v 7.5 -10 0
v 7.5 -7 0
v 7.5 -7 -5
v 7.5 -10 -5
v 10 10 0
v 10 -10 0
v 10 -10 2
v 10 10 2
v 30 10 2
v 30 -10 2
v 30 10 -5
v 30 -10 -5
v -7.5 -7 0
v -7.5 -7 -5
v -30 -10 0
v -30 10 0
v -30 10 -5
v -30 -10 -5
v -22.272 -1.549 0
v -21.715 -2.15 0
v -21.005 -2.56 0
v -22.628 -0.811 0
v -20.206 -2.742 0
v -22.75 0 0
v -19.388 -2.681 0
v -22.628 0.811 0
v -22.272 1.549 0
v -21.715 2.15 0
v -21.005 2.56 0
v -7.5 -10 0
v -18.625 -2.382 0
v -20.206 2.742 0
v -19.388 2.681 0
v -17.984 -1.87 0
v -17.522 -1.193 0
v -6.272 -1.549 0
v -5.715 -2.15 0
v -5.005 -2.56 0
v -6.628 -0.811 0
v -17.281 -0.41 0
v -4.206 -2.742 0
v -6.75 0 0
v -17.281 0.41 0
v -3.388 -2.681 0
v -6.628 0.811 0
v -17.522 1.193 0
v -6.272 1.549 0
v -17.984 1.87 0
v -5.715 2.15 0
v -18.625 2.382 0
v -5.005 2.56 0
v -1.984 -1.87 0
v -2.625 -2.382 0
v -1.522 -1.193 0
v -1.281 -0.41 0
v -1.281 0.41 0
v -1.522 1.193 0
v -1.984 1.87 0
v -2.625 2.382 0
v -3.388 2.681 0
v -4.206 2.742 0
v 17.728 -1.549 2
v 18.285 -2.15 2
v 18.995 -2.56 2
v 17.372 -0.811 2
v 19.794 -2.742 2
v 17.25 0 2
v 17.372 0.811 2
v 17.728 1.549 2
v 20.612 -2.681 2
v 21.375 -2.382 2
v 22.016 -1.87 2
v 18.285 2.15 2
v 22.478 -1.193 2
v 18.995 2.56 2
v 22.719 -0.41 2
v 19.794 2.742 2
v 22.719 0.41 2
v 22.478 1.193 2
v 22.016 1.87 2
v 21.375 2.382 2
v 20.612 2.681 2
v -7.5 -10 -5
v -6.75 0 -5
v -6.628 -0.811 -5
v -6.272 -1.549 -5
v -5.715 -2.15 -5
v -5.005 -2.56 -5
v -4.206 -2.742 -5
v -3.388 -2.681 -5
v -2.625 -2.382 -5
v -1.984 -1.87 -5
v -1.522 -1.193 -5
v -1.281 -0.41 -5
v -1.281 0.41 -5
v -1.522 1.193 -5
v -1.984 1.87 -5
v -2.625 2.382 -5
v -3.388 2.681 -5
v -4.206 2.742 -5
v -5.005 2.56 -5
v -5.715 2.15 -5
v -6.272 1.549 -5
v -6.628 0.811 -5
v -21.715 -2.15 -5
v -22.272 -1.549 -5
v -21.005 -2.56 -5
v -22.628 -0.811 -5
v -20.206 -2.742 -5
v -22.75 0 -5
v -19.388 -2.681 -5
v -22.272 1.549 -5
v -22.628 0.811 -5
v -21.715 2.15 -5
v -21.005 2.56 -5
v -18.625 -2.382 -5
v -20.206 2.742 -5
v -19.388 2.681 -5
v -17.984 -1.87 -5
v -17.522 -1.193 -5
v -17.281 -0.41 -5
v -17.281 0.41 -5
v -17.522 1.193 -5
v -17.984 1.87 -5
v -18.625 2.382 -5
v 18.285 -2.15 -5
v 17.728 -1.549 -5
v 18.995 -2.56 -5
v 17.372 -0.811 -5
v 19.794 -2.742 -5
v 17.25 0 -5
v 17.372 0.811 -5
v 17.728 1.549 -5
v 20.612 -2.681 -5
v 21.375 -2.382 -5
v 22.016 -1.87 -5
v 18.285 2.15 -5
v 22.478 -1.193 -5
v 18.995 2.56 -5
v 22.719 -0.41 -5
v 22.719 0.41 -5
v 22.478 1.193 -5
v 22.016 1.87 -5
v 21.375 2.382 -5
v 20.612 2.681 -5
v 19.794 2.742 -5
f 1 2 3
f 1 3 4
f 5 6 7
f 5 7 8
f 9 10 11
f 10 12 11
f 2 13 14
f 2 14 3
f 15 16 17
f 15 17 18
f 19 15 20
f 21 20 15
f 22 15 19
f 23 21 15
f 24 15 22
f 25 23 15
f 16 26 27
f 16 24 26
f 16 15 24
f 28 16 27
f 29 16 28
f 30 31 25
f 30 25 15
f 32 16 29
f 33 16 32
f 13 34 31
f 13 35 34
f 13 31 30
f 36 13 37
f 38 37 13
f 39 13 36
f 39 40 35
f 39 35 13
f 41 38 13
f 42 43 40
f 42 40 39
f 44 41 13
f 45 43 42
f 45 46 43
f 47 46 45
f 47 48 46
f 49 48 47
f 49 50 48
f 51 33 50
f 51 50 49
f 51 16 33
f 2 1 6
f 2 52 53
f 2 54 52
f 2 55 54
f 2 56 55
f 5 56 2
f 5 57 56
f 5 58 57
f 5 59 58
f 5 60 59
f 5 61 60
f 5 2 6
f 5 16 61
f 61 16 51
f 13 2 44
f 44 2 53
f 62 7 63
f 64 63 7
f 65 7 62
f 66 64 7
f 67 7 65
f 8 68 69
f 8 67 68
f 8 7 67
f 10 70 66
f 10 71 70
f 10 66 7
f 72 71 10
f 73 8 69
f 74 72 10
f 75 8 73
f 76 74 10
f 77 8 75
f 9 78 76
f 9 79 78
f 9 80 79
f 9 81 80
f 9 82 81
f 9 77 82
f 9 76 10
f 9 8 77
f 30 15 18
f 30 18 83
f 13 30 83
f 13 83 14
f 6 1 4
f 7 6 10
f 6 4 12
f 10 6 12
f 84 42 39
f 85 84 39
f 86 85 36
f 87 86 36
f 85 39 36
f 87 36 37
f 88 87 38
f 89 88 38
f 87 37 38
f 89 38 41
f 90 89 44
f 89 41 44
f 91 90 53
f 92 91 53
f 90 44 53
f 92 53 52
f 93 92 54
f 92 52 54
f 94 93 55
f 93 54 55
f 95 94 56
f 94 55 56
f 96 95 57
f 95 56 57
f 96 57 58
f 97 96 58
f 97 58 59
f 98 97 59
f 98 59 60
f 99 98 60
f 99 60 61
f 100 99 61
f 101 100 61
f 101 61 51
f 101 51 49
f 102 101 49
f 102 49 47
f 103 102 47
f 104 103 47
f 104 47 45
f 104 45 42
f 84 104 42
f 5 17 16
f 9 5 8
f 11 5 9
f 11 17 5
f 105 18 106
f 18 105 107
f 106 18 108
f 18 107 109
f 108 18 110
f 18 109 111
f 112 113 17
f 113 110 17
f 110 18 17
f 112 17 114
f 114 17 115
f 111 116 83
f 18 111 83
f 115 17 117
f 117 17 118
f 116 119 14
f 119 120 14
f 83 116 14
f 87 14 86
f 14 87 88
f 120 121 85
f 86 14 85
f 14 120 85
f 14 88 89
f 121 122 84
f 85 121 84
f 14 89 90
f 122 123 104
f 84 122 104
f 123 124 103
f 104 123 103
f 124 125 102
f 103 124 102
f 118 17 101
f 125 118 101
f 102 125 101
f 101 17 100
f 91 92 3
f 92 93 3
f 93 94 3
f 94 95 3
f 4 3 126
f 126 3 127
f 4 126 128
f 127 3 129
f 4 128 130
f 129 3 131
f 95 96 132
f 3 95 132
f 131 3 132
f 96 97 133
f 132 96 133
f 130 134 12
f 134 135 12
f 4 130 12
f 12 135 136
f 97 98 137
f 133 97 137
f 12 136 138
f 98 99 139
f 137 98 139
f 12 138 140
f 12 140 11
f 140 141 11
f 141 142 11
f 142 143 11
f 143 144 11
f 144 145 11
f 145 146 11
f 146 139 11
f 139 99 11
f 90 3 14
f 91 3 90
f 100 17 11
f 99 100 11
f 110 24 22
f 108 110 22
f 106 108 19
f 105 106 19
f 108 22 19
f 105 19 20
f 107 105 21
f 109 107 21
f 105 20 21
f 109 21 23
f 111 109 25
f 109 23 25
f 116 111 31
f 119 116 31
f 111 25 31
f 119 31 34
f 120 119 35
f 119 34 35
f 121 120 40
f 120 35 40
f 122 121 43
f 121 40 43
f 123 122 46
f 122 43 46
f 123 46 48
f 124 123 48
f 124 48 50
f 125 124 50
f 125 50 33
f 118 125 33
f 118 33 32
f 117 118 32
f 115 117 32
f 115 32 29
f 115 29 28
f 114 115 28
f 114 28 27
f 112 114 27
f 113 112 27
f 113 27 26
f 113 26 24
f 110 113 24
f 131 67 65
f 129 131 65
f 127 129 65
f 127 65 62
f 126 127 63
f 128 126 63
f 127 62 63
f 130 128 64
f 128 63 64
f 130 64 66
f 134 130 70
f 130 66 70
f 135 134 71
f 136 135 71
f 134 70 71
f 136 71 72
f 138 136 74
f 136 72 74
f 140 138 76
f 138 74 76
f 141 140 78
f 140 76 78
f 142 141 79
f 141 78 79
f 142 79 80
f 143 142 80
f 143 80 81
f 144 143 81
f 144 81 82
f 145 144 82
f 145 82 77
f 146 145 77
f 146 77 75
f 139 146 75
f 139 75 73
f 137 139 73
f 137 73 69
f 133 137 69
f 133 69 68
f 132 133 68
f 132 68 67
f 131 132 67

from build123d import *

# Parameters (mm, degrees)
F0_W     = 20
F0_H     = 20
F1_DEPTH = 5
F2_DEPTH = 2
F4_D     = 5.5


with BuildPart() as f1:
    # F0 (on Top) → F1 (new body)
    with BuildSketch(Plane.XY):
        Polygon((10, 10), (-30, 10), (-30, -10), (-7.5, -10), (-7.5, -7), (7.5, -7), (7.5, -10), (10, -10), align=None)
        with Locations((20, 0)):
            Rectangle(F0_W, F0_H)
    extrude(amount=-F1_DEPTH)

    # F0 (on Top) → F2 (join)
    with BuildSketch(Plane.XY):
        with Locations((20, 0)):
            Rectangle(F0_W, F0_H)
    extrude(amount=F2_DEPTH)

    # F4 (through all)
    with Locations(Plane(origin=(0, 0, -5), x_dir=(1, 0, 0), z_dir=(0, 0, -1))):
        with Locations((-20, 0), (20, 0), (-4, 0)):
            Hole(F4_D / 2)


solid = f1.part
